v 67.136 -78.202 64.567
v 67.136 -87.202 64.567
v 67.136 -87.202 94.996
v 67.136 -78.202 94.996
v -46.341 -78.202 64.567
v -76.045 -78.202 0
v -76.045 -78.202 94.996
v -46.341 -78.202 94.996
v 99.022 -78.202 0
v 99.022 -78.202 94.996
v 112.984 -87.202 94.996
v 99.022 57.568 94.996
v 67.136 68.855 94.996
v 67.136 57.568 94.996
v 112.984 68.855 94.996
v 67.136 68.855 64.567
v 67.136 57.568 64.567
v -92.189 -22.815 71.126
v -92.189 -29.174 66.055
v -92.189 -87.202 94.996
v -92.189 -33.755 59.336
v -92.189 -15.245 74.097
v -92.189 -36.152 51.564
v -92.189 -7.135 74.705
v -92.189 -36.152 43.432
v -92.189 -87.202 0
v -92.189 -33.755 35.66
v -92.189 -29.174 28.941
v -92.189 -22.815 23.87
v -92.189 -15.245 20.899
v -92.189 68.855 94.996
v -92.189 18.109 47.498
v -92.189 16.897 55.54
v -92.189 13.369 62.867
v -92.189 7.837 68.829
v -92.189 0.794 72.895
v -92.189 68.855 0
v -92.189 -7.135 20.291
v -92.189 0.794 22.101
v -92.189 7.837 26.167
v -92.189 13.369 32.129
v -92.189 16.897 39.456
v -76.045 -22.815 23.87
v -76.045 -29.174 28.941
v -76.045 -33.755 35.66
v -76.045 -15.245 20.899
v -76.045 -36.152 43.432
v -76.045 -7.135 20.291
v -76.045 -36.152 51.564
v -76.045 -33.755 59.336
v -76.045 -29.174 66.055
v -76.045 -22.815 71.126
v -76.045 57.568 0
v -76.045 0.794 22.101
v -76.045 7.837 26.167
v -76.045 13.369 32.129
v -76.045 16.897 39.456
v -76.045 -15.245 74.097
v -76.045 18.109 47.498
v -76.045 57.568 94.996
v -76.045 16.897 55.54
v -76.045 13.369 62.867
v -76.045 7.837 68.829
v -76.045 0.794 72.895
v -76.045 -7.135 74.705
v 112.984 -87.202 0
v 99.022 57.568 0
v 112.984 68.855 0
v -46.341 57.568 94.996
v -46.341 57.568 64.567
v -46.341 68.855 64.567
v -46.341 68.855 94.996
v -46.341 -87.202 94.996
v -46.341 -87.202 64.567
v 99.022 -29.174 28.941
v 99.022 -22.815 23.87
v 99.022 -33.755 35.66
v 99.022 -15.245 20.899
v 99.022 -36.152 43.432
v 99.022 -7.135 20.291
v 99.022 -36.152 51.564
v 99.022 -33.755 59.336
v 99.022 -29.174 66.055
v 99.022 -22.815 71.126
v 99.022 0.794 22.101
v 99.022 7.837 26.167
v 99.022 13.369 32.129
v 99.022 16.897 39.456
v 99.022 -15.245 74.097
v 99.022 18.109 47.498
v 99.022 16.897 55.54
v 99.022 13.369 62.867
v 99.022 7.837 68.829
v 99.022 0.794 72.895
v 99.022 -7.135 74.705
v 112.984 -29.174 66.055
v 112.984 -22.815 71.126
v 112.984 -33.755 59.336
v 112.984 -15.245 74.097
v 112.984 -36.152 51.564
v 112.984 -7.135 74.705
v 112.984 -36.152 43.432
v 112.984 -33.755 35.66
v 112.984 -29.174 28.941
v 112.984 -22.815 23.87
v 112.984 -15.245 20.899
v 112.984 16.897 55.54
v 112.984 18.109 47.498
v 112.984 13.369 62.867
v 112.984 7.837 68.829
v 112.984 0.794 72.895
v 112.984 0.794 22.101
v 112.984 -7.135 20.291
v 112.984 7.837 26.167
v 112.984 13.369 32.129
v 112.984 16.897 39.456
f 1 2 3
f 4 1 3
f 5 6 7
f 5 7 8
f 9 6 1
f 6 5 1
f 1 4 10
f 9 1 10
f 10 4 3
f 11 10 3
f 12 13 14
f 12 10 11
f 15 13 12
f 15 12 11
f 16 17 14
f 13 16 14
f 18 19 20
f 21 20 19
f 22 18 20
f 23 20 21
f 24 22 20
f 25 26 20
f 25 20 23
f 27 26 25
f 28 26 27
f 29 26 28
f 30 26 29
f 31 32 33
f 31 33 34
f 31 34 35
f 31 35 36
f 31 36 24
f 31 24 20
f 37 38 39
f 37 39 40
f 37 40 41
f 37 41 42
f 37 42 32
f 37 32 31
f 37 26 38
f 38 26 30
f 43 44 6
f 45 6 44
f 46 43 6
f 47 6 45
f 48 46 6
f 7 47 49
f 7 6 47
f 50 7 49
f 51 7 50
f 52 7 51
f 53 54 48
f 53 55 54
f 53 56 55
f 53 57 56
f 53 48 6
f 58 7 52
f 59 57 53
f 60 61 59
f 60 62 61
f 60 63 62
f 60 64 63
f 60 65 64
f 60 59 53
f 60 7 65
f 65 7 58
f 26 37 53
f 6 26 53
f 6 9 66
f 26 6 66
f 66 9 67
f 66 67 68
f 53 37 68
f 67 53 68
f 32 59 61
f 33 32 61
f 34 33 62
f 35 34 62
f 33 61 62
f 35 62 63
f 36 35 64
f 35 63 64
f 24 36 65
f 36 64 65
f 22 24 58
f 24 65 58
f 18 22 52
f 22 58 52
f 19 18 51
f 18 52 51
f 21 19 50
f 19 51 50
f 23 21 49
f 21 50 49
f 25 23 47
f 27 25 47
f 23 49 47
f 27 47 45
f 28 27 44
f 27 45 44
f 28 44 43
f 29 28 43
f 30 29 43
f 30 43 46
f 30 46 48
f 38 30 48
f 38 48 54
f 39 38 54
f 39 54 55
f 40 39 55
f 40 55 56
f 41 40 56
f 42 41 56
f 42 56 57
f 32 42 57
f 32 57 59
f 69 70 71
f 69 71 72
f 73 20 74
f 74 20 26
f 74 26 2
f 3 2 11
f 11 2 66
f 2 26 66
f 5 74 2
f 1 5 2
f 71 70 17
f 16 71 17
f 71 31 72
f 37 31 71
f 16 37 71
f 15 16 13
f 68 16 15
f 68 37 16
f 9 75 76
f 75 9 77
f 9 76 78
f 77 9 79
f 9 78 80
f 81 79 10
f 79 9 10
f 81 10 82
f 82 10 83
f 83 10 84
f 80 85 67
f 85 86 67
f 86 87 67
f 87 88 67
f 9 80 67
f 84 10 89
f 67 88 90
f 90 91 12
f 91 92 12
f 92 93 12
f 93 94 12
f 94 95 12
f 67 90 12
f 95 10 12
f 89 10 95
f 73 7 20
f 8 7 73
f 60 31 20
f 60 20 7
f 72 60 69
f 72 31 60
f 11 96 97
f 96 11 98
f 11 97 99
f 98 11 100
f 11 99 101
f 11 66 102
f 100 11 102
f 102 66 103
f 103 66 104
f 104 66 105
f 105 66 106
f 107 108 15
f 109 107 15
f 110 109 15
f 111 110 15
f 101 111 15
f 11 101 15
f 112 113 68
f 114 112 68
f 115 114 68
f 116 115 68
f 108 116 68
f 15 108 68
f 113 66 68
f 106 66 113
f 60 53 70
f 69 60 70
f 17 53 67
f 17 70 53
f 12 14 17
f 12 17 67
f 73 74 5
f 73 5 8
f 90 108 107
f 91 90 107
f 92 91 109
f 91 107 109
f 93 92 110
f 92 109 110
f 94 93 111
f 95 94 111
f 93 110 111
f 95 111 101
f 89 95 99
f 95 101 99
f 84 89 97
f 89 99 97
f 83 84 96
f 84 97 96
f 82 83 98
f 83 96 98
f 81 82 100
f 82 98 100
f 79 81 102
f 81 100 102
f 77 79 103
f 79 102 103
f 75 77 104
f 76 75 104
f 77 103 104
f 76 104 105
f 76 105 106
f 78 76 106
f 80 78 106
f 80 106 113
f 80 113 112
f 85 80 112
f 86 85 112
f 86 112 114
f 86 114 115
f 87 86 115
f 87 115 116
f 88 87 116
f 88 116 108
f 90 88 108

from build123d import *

# Parameters (mm, degrees)
F0_W     = 205.173201859
F0_H     = 156.0566946864
F1_DEPTH = 94.996
F2_W     = 175.066800788
F2_H     = 135.7703600079
F3_DEPTH = 115.57
F4_R     = 27.2832059301
F5_DEPTH = 205.174201859
F6_W     = 113.4773865342
F6_H     = 60.8573002977
F7_DEPTH = 156.0576946864


with BuildPart() as f1:
    # F0 (on Top) → F1 (new body)
    with BuildSketch(Plane.XY):
        with Locations((10.3972144425, -9.1738365591)):
            Rectangle(F0_W, F0_H)
    extrude(amount=F1_DEPTH)

    # F2 (on face) → F3 (cut)
    with BuildSketch(Plane.XY.offset(94.996)):
        with Locations((11.4888912067, -10.3168571368)):
            Rectangle(F2_W, F2_H)
    extrude(amount=-F3_DEPTH, mode=Mode.SUBTRACT)

    # F4 (on face) → F5 (cut, through all)
    with BuildSketch(Plane.YZ.offset(112.983815372)):
        with Locations((-9.1738365591, 47.498)):
            Circle(F4_R)
    extrude(amount=-F5_DEPTH, mode=Mode.SUBTRACT)

    # F6 (on face) → F7 (cut, through all)
    with BuildSketch(Plane.XZ.offset(87.2021839023)):
        with Locations((10.3972144425, 94.996)):
            Rectangle(F6_W, F6_H)
    extrude(amount=-F7_DEPTH, mode=Mode.SUBTRACT)


solid = f1.part
